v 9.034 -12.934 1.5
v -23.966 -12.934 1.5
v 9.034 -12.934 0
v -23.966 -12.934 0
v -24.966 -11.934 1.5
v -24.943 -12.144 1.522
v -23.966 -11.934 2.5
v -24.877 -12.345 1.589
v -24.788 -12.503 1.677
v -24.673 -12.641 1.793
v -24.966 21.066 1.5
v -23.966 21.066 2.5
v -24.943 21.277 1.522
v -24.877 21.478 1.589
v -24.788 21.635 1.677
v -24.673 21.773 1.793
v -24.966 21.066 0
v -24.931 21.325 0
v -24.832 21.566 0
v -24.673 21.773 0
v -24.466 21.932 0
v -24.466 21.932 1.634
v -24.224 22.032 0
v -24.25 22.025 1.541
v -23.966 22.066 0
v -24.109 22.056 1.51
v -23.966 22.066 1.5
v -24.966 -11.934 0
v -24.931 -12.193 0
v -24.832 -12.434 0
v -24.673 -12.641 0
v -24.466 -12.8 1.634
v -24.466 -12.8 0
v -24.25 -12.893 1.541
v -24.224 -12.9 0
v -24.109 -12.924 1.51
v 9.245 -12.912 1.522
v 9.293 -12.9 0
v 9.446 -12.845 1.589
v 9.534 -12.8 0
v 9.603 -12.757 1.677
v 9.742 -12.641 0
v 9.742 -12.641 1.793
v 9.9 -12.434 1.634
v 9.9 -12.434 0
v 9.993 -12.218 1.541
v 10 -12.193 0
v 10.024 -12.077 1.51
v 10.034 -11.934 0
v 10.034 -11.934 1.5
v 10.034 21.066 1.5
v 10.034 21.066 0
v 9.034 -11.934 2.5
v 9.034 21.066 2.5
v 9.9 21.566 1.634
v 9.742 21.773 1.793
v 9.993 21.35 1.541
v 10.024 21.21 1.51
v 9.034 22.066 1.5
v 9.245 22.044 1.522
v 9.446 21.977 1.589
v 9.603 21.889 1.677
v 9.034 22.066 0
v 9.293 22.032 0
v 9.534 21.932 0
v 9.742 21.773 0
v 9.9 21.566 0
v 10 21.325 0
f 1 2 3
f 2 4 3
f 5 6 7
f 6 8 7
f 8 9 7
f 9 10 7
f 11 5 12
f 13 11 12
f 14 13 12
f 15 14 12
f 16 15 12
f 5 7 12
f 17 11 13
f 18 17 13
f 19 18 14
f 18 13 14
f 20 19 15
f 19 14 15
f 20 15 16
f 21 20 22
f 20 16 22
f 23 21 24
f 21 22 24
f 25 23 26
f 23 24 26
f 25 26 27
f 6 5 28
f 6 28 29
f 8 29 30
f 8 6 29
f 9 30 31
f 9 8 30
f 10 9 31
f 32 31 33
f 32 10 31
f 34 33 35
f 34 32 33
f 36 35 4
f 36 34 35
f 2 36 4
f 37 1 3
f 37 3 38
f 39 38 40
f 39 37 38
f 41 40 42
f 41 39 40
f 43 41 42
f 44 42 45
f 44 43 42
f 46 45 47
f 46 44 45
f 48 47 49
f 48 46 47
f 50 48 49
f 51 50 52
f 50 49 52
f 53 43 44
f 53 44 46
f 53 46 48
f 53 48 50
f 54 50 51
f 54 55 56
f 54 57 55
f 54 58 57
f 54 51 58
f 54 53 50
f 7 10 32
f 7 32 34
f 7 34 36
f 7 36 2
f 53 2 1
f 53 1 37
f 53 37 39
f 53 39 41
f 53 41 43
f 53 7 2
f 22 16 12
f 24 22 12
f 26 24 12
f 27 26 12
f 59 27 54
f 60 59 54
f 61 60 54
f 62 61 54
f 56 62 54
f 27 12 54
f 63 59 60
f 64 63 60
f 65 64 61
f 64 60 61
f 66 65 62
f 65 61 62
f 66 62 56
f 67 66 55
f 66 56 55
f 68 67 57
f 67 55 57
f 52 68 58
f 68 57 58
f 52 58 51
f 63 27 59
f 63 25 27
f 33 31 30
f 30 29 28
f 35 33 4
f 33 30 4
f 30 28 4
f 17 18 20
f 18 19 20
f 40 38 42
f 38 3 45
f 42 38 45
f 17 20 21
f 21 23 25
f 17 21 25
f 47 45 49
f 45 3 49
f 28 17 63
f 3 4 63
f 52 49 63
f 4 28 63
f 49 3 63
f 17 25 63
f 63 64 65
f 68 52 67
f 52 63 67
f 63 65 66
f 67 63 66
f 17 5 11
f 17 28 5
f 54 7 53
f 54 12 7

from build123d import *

# Parameters (mm, degrees)
F0_W     = 35
F0_H     = 35
F1_DEPTH = 2.5
F2_SIZE  = 1
F3_R     = 1
F4_R     = 1


with BuildPart() as f1:
    # F0 (on Top) → F1 (new body)
    with BuildSketch(Plane.XY):
        with Locations((-7.465527, 4.566053)):
            Rectangle(F0_W, F0_H)
    extrude(amount=F1_DEPTH)

    # F2
    f2_edges = [f1.edges().sort_by_distance(p)[0] for p in [
        (-7.465527, -12.933947, 2.5),
        (-24.965527, 4.566053, 2.5),
        (-7.465527, 22.066053, 2.5),
        (10.034473, 4.566053, 2.5),
    ]]
    chamfer(f2_edges, length=F2_SIZE)

    # F3
    f3_edges = [f1.edges().sort_by_distance(p)[0] for p in [
        (-24.965527, -12.933947, 0.75),
    ]]
    fillet(f3_edges, radius=F3_R)

    # F4
    f4_edges = [f1.edges().sort_by_distance(p)[0] for p in [
        (-24.965527, 22.066053, 0.75),
        (10.034473, 22.066053, 0.75),
        (10.034473, -12.933947, 0.75),
    ]]
    fillet(f4_edges, radius=F4_R)


solid = f1.part
